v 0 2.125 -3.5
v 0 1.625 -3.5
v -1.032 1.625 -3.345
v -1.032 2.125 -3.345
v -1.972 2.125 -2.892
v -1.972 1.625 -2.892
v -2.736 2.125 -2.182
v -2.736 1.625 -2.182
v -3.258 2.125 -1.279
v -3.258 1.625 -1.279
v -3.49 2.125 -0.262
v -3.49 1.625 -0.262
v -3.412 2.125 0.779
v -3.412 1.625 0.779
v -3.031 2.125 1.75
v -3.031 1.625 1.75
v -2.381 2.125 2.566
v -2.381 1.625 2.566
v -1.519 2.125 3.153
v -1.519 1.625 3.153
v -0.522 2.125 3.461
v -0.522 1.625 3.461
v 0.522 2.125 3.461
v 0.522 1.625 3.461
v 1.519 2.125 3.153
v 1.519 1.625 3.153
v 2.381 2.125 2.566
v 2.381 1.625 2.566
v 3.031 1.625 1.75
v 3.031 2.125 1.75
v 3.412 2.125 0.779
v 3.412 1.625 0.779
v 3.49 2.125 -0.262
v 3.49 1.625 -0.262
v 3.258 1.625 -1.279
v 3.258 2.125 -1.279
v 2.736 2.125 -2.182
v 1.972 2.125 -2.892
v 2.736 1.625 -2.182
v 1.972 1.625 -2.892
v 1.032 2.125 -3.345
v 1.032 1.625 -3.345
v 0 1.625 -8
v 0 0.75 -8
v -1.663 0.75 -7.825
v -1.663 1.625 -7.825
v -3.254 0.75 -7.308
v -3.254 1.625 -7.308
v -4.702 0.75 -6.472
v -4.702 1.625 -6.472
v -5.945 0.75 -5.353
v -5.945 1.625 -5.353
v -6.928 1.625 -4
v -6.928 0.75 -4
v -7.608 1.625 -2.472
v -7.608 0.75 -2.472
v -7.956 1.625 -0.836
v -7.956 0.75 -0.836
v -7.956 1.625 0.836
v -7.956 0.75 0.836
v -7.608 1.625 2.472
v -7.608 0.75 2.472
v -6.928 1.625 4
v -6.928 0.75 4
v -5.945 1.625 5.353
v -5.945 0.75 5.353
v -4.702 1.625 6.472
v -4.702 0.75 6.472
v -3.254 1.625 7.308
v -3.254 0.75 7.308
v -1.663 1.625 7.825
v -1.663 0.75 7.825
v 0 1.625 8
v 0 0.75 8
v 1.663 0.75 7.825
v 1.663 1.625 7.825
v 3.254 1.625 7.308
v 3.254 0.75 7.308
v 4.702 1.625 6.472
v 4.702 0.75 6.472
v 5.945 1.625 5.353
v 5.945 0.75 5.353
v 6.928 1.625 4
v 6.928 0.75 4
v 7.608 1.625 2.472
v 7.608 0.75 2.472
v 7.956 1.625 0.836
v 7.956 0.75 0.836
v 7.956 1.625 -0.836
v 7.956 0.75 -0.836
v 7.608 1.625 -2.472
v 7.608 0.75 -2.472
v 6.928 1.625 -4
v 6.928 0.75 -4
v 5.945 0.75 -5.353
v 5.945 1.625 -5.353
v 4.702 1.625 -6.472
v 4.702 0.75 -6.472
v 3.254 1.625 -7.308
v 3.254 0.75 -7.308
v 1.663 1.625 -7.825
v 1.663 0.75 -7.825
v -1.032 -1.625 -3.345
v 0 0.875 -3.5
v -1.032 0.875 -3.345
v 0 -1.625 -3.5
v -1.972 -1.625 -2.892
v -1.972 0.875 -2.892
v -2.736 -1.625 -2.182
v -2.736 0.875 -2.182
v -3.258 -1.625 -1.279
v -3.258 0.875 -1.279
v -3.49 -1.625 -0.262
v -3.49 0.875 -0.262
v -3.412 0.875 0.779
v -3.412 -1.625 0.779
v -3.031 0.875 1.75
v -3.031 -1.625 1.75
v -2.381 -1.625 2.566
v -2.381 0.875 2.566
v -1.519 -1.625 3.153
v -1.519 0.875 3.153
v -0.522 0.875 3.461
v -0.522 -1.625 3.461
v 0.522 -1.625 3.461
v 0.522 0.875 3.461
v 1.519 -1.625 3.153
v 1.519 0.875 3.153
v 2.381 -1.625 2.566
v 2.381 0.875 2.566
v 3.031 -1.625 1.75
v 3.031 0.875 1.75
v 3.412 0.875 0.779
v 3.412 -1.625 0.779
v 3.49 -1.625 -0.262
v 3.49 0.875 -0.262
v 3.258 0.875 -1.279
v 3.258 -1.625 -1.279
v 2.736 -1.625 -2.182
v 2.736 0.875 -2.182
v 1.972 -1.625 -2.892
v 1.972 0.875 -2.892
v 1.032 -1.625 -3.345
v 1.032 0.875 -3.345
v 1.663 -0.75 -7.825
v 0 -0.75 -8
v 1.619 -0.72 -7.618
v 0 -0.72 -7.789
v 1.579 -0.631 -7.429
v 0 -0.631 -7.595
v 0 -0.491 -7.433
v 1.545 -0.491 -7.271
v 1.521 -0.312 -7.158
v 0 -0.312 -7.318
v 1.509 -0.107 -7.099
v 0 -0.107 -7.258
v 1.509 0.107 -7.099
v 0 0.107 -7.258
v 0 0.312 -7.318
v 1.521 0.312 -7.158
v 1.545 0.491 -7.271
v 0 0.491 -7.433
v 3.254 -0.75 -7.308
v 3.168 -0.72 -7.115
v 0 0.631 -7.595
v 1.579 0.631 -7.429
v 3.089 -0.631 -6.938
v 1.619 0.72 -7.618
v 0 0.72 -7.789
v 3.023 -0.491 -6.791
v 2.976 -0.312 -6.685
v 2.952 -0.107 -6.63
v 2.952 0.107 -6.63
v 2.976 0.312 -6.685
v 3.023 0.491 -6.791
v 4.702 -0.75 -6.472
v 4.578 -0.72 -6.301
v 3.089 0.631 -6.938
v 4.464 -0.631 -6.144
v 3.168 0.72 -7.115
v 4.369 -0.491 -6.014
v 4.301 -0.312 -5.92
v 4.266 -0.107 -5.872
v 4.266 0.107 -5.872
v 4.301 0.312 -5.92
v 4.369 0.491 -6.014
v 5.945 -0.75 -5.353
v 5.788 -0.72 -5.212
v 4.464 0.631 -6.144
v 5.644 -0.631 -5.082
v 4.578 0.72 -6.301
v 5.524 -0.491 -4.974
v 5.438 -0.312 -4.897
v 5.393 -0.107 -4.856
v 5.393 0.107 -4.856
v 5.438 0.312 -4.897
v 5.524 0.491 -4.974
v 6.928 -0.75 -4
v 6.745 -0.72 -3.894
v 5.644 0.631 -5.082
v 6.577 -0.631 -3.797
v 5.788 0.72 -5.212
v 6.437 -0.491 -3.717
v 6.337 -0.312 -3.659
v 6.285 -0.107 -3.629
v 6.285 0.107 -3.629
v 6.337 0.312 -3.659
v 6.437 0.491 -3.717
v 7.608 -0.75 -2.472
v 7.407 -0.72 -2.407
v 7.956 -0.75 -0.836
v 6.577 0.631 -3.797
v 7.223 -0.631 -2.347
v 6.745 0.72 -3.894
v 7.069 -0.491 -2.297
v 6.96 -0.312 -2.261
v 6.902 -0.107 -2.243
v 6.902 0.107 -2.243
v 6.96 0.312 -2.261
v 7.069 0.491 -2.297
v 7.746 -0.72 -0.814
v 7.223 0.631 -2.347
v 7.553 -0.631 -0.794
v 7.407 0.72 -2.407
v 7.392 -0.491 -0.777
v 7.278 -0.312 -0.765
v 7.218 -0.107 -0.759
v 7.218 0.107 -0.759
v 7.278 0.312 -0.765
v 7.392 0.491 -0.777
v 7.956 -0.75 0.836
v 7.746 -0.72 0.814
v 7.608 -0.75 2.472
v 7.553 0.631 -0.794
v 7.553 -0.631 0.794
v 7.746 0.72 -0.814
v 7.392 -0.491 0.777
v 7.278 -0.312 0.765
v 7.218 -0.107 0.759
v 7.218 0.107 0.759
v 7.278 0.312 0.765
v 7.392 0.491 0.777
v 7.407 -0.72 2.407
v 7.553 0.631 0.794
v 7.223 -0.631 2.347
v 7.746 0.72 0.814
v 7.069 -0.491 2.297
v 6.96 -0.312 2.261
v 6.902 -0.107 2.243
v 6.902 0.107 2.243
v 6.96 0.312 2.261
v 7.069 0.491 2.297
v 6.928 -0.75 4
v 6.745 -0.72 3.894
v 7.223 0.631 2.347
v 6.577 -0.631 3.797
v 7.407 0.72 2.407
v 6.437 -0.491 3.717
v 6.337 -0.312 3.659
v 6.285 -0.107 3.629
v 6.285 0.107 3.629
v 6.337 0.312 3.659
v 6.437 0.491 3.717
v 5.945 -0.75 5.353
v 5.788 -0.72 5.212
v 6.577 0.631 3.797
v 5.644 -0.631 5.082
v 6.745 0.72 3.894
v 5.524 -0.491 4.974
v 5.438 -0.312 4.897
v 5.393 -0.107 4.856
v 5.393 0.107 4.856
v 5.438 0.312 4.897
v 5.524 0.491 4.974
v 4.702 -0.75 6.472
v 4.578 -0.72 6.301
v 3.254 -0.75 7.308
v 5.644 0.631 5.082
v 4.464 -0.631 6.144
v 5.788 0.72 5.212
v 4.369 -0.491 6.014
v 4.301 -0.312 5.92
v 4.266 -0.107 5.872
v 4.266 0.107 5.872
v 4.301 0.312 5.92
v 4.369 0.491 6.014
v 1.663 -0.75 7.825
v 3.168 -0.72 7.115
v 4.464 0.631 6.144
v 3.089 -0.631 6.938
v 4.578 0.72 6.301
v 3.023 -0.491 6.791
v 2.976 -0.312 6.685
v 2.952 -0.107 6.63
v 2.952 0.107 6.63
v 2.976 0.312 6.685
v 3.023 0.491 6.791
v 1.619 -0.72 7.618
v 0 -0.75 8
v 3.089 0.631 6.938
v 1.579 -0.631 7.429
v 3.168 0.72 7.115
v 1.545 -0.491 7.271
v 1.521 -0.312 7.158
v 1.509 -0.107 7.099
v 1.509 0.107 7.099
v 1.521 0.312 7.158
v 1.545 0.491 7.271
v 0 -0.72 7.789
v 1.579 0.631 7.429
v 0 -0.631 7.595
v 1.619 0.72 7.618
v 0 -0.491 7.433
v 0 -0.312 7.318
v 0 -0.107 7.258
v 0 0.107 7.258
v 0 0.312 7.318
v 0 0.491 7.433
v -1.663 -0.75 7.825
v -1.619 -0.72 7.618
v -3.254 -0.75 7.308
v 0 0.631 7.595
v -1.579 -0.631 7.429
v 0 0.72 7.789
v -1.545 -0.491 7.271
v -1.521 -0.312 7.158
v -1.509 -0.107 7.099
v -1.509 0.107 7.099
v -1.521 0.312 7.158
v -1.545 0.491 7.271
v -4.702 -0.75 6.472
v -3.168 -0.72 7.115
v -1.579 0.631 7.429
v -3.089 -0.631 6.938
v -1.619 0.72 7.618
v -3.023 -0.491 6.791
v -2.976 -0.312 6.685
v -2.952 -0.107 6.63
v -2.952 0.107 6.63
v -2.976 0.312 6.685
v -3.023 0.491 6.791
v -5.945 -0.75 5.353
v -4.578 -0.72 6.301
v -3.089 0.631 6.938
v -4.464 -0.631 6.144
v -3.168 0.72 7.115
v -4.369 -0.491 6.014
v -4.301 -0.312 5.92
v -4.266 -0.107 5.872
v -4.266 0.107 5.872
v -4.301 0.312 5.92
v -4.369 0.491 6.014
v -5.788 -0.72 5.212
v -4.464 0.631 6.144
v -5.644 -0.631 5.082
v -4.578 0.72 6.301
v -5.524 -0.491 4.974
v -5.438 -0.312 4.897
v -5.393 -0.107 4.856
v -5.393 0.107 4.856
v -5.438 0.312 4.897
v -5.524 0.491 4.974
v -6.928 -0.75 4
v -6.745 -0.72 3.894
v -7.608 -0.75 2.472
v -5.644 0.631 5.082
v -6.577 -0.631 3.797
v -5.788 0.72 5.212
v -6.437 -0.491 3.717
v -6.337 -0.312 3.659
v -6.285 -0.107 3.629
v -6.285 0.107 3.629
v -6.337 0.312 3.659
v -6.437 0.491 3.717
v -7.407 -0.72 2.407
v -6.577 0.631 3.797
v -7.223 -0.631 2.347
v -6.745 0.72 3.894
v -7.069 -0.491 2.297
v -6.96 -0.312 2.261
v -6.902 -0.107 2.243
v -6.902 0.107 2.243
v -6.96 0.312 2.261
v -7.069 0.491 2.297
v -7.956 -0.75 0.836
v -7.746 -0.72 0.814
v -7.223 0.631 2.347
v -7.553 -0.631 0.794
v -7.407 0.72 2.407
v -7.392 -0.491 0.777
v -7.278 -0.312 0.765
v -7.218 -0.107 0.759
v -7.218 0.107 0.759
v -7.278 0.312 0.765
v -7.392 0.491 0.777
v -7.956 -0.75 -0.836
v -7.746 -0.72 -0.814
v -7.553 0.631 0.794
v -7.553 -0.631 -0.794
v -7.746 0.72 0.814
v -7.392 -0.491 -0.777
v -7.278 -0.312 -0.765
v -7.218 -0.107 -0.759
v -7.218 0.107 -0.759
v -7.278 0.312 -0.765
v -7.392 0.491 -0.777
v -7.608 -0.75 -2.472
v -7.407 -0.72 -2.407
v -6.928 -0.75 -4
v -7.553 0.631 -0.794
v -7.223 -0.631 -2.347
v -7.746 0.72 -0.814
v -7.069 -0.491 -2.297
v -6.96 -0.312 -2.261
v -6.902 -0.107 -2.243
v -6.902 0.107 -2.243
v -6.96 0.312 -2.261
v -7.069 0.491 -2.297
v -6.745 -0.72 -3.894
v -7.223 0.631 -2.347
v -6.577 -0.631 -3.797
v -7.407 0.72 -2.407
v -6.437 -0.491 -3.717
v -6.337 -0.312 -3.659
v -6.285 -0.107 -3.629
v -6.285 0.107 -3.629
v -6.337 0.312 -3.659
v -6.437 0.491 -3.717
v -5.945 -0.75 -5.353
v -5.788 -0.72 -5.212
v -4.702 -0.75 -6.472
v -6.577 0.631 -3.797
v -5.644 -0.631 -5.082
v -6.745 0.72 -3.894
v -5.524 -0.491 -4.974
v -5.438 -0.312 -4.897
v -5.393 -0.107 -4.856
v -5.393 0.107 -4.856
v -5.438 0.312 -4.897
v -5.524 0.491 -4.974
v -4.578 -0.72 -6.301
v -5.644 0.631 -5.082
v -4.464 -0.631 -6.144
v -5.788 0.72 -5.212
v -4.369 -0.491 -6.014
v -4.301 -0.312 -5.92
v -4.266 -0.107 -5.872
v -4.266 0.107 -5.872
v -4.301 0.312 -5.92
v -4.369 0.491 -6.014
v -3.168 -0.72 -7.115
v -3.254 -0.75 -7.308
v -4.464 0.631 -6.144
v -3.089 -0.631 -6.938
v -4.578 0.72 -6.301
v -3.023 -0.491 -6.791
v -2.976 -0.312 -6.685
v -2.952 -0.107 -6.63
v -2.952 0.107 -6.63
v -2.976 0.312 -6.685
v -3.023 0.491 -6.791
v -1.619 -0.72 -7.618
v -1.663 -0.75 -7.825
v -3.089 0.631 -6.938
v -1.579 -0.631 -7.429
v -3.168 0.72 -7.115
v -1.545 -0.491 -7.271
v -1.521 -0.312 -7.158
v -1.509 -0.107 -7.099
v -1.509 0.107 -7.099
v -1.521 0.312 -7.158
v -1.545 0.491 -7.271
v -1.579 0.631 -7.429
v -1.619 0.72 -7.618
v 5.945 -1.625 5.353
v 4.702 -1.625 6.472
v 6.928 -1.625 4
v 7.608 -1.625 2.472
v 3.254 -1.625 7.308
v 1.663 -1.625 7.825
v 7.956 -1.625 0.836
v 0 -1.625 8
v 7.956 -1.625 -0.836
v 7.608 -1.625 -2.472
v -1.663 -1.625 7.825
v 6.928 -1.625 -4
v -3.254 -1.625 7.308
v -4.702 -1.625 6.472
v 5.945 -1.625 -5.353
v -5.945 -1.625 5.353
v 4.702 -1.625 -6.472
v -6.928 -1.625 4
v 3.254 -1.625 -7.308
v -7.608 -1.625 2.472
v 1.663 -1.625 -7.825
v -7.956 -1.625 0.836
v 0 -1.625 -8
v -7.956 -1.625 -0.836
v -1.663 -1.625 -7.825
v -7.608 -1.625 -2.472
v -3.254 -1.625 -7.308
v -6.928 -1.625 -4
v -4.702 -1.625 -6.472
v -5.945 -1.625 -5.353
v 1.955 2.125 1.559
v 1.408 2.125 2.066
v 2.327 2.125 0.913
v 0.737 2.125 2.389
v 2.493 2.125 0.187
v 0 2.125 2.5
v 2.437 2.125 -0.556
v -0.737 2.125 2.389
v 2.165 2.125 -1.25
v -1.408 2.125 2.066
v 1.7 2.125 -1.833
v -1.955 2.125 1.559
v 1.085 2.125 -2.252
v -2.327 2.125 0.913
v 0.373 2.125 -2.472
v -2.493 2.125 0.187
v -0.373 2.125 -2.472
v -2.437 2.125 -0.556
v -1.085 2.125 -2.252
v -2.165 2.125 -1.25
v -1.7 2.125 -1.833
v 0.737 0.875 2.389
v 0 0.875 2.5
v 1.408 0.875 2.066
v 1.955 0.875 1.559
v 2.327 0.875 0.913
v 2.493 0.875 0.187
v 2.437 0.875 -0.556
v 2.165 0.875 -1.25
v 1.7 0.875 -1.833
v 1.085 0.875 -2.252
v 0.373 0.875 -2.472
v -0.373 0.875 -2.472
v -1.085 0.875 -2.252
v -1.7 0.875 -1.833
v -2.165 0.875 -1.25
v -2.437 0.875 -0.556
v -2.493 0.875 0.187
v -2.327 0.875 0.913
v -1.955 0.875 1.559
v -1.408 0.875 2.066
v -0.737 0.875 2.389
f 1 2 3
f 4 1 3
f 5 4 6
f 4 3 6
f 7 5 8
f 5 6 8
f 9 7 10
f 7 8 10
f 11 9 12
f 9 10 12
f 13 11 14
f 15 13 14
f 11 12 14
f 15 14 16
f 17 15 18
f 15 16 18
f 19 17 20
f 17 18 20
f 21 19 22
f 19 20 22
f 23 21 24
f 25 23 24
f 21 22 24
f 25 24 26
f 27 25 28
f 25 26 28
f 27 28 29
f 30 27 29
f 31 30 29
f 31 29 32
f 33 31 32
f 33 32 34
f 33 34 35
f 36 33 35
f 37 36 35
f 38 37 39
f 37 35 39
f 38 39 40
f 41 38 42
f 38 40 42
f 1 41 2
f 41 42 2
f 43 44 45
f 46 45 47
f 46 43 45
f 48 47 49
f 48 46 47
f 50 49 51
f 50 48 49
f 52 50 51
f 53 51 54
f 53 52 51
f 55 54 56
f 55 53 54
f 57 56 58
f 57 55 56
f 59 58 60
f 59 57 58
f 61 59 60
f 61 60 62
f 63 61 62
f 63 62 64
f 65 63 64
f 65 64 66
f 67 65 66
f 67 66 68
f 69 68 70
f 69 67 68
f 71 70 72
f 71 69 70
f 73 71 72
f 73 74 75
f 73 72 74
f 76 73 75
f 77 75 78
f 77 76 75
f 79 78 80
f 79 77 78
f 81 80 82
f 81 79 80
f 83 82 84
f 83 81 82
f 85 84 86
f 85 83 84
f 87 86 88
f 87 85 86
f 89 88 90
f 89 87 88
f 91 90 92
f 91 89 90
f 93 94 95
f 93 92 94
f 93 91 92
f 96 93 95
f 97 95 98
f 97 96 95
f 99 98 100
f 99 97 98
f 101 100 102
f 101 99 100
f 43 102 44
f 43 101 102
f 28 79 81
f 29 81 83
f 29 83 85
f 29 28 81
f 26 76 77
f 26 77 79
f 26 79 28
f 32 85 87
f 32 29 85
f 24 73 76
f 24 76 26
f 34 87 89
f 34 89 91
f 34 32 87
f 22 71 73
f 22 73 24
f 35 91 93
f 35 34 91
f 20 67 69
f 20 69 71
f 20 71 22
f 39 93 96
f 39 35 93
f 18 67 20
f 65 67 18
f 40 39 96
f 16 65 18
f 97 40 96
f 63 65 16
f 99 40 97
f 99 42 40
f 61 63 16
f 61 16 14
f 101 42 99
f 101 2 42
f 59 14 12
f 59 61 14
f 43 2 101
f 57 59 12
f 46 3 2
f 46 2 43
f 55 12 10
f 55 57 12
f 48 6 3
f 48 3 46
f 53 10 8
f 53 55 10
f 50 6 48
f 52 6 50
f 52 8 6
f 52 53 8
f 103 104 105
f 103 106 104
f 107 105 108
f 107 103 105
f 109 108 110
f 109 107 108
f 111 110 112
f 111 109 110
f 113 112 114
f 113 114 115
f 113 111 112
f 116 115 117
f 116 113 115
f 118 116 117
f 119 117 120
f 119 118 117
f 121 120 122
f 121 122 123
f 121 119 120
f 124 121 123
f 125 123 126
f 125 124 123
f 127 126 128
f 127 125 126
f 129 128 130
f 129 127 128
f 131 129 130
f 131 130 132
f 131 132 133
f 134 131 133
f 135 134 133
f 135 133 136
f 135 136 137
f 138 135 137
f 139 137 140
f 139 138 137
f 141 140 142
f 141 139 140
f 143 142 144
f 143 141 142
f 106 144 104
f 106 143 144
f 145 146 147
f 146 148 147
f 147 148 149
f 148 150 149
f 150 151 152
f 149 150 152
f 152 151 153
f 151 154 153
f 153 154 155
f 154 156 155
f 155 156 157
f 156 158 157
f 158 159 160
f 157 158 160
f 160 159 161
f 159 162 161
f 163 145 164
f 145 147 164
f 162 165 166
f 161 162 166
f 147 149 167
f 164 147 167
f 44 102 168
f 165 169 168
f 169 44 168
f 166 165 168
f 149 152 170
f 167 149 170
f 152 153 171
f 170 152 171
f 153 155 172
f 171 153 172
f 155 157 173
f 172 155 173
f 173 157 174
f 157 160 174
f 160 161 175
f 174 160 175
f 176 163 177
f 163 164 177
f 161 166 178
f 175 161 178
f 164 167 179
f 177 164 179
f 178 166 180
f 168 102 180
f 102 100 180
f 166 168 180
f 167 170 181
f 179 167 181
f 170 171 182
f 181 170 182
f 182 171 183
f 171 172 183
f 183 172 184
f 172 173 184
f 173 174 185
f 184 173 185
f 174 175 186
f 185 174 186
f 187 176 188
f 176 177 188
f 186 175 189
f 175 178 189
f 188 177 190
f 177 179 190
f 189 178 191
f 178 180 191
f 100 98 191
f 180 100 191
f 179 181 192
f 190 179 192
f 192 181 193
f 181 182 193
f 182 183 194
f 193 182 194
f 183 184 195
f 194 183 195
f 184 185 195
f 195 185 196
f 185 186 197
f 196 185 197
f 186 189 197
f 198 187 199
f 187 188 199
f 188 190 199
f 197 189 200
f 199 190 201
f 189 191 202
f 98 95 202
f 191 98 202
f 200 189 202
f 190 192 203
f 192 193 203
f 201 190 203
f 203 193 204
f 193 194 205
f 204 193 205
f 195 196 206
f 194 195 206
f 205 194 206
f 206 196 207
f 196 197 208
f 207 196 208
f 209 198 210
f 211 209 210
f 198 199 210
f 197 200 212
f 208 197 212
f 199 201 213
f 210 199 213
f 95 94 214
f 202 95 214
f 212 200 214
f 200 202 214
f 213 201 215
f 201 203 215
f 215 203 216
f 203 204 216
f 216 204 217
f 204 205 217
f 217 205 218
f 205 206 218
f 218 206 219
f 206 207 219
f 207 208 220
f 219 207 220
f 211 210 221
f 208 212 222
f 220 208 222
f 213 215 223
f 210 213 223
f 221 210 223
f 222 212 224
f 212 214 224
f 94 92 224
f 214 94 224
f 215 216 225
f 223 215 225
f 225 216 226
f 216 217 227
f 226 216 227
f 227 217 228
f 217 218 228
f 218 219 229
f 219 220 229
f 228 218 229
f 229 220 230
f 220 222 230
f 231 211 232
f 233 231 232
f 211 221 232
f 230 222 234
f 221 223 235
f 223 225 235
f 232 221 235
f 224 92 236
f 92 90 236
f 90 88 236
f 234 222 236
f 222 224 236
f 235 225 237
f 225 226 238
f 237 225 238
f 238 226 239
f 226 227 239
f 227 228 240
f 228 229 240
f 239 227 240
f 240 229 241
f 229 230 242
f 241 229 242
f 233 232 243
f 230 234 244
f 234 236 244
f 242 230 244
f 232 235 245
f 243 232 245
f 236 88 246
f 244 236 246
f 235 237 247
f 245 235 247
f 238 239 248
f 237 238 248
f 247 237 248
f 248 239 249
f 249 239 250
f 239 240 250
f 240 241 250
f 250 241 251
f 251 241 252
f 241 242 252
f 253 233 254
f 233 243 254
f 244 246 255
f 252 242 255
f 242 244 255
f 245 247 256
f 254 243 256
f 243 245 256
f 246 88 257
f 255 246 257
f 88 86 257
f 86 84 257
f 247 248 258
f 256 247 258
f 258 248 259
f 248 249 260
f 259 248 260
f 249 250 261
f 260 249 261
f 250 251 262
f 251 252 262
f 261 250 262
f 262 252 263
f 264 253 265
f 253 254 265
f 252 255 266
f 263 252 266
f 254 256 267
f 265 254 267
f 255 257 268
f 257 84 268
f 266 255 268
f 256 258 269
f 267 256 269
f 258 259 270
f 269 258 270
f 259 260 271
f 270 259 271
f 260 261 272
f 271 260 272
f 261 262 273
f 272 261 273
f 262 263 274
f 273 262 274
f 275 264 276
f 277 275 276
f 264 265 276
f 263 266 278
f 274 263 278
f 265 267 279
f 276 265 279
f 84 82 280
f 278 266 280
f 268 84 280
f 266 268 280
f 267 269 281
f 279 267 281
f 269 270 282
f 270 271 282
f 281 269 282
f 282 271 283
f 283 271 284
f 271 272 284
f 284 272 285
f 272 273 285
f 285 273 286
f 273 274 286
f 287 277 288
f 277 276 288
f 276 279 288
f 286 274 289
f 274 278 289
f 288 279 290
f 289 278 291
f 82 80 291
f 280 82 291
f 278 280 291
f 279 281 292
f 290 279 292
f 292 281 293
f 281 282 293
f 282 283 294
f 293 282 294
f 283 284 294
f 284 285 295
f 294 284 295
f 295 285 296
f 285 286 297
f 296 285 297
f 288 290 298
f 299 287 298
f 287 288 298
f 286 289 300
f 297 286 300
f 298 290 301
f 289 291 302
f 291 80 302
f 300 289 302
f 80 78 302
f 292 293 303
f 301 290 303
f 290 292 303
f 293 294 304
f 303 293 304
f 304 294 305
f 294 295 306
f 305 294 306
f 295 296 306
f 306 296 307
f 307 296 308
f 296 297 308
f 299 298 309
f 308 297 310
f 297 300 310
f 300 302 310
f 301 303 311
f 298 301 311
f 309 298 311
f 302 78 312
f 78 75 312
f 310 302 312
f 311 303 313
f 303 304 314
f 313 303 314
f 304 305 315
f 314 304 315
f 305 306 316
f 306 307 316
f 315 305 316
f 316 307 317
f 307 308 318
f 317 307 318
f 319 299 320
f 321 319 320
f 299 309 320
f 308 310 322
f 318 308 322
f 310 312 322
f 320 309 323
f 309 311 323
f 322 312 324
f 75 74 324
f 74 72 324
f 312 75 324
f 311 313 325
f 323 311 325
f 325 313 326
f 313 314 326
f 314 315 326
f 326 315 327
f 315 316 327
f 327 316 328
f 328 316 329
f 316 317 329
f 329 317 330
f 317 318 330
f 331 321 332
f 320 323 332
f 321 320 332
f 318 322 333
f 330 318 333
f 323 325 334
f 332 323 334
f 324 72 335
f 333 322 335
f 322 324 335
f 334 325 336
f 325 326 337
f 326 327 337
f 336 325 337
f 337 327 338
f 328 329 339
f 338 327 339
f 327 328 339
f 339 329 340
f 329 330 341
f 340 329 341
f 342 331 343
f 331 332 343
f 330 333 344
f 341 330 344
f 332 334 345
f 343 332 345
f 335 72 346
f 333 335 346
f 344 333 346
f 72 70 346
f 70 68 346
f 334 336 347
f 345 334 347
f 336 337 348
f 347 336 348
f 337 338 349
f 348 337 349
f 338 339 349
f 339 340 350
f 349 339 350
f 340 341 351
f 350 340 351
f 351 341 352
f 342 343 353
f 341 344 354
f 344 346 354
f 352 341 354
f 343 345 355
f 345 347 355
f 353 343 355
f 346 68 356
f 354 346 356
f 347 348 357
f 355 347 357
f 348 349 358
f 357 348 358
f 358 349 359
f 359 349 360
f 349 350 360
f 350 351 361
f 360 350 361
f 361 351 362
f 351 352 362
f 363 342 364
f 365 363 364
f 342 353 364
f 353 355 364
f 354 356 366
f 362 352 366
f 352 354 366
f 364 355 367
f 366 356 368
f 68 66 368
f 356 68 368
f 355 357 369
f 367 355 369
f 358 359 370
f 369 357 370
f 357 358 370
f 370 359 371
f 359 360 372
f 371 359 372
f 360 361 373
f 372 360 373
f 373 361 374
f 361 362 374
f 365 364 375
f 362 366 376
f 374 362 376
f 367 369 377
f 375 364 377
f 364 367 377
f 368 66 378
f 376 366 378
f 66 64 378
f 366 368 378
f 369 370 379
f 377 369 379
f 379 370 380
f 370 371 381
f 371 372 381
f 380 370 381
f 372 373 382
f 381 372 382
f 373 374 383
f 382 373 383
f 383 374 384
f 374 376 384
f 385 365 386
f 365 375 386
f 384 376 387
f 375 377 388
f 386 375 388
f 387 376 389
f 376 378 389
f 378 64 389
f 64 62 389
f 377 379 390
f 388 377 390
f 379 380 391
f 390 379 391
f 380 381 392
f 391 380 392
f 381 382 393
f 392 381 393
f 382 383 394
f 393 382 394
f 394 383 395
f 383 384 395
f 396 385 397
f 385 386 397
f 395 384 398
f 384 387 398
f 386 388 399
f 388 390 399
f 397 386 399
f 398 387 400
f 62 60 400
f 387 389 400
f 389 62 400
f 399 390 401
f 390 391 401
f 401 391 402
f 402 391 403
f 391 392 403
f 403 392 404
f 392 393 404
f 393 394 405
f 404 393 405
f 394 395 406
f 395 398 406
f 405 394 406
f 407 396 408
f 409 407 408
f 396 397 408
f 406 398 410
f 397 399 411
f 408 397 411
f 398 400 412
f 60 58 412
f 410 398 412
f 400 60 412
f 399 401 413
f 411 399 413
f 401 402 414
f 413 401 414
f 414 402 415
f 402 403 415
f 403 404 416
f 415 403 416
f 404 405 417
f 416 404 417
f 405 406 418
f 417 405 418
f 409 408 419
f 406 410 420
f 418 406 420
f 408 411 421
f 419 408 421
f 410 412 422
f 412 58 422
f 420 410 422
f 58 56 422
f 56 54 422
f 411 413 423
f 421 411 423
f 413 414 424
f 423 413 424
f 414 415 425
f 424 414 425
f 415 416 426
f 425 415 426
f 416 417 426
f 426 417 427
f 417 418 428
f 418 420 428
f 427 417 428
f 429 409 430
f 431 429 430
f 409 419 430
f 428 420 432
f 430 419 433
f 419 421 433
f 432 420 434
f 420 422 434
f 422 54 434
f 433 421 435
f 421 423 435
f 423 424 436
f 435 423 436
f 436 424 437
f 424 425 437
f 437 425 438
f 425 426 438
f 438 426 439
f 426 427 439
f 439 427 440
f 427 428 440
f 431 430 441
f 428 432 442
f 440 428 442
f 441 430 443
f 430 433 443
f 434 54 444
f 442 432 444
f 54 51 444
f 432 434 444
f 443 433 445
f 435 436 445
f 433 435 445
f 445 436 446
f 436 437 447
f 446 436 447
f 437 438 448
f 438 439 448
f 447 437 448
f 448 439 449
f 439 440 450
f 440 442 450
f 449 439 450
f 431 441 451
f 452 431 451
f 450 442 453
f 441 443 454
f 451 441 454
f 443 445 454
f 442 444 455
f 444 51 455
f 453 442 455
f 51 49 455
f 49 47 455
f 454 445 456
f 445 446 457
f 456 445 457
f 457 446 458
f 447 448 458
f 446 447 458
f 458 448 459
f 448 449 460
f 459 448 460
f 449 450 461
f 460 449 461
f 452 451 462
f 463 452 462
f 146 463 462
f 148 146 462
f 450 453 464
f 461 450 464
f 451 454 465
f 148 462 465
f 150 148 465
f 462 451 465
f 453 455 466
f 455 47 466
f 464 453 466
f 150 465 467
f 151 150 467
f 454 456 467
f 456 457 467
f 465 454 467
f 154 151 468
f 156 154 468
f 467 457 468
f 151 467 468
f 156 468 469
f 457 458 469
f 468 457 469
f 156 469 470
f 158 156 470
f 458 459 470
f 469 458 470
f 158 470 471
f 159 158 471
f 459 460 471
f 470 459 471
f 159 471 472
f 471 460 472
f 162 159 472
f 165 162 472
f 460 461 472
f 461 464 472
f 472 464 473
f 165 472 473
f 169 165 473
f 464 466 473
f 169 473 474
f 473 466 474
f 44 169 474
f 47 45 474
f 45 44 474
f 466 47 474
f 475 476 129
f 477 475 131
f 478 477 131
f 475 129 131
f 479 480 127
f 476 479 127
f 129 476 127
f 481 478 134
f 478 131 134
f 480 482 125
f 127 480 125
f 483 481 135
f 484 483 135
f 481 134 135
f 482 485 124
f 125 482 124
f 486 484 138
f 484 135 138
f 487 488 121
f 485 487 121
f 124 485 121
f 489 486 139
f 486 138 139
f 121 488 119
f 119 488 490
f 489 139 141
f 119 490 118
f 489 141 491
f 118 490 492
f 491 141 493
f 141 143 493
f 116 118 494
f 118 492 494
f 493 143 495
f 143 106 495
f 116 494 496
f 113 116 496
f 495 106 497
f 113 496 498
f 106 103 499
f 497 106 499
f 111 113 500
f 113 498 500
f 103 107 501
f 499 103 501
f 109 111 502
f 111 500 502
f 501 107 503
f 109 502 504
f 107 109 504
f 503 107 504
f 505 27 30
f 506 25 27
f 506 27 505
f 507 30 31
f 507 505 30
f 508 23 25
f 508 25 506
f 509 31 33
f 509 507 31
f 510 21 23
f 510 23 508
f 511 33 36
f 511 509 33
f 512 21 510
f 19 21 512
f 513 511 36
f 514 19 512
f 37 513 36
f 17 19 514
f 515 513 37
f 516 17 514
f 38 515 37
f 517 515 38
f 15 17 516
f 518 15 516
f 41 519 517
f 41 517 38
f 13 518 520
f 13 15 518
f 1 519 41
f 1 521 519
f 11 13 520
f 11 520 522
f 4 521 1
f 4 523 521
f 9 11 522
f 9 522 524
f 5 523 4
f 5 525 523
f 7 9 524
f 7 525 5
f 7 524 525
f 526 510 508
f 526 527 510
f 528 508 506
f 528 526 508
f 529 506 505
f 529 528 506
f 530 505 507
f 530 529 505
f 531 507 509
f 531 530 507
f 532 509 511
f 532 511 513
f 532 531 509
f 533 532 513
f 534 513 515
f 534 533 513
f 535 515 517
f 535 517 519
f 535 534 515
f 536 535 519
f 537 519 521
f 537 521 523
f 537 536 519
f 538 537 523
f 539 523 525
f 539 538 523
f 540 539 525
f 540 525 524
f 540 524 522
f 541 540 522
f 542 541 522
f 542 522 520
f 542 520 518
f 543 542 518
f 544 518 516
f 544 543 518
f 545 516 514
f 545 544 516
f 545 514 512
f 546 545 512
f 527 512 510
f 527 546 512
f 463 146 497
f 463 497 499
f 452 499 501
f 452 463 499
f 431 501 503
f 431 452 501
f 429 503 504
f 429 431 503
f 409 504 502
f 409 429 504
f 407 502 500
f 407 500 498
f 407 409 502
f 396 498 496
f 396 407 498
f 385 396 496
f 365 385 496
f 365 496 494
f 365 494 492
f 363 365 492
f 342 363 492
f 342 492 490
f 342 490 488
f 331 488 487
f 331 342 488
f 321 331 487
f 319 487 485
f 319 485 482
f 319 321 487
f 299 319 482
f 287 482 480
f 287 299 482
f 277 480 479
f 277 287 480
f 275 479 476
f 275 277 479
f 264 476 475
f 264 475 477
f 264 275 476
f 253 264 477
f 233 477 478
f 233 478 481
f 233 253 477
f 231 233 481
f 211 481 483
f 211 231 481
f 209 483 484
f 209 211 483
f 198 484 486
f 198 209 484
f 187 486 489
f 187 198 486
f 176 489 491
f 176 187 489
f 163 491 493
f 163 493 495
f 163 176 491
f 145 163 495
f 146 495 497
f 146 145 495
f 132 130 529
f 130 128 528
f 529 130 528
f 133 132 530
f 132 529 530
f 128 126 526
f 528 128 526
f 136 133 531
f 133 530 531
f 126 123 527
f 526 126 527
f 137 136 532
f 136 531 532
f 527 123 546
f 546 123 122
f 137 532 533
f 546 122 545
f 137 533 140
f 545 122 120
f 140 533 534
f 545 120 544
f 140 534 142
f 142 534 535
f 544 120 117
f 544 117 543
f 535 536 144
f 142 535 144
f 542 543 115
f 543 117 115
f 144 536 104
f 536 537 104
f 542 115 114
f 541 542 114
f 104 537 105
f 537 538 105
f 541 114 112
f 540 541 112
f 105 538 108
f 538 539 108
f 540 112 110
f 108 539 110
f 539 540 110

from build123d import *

# Parameters (mm, degrees)
SKETCH1_R           = 8
SKETCH1_R_2         = 3.5
BOSS_EXTRUDE1_DEPTH = 1.625
BOSS_EXTRUDE2_START = -0.75
SKETCH3_R           = 3.5
SKETCH3_R_2         = 2.5
BOSS_EXTRUDE2_DEPTH = 0.75
SKETCH4_R           = 3.5
SKETCH4_R_2         = 2.5
BOSS_EXTRUDE3_DEPTH = 0.5


with BuildPart() as part:
    # Sketch1 → Boss-Extrude1 (new, symmetric)
    with BuildSketch(Plane(origin=(0, 0, 0), x_dir=(1, 0, 0), z_dir=(0, 1, 0))):
        with Locations(Location((0, 0, 0), (0, 0, 90))):
            Circle(SKETCH1_R)
        with Locations(Location((0, 0, 0), (0, 0, 90))):
            Circle(SKETCH1_R_2, mode=Mode.SUBTRACT)
    extrude(amount=BOSS_EXTRUDE1_DEPTH, both=True)

    # Sketch2 → Cut-Revolve1 (revolve, cut)
    with BuildSketch(Plane(origin=(0, 0, 0), x_dir=(0, 0, -1), z_dir=(1, 0, 0)), mode=Mode.PRIVATE) as cut_revolve1_sk:
        with BuildLine():
            Line((-8, 0.75), (-8, -0.75))
            ThreePointArc((-8, -0.75), (-7.25, 0), (-8, 0.75))
        make_face()
    revolve(cut_revolve1_sk.sketch.rotate(Axis((0, 1.625, 0), (0, -1, 0)), 180), axis=Axis((0, 1.625, 0), (0, -1, 0)), mode=Mode.SUBTRACT)

    # Sketch3 → Boss-Extrude2 (add)
    with BuildSketch(Plane(origin=(0, 1.625, 0), x_dir=(1, 0, 0), z_dir=(0, 1, 0)).offset(BOSS_EXTRUDE2_START)):
        with Locations(Location((0, 0, 0), (0, 0, 90))):
            Circle(SKETCH3_R)
        with Locations(Location((0, 0, 0), (0, 0, 270))):
            Circle(SKETCH3_R_2, mode=Mode.SUBTRACT)
    extrude(amount=BOSS_EXTRUDE2_DEPTH)

    # Sketch4 → Boss-Extrude3 (add)
    with BuildSketch(Plane(origin=(0, 1.625, 0), x_dir=(1, 0, 0), z_dir=(0, 1, 0))):
        with Locations(Location((0, 0, 0), (0, 0, 90))):
            Circle(SKETCH4_R)
        with Locations(Location((0, 0, 0), (0, 0, 270))):
            Circle(SKETCH4_R_2, mode=Mode.SUBTRACT)
    extrude(amount=BOSS_EXTRUDE3_DEPTH)


solid = part.part
